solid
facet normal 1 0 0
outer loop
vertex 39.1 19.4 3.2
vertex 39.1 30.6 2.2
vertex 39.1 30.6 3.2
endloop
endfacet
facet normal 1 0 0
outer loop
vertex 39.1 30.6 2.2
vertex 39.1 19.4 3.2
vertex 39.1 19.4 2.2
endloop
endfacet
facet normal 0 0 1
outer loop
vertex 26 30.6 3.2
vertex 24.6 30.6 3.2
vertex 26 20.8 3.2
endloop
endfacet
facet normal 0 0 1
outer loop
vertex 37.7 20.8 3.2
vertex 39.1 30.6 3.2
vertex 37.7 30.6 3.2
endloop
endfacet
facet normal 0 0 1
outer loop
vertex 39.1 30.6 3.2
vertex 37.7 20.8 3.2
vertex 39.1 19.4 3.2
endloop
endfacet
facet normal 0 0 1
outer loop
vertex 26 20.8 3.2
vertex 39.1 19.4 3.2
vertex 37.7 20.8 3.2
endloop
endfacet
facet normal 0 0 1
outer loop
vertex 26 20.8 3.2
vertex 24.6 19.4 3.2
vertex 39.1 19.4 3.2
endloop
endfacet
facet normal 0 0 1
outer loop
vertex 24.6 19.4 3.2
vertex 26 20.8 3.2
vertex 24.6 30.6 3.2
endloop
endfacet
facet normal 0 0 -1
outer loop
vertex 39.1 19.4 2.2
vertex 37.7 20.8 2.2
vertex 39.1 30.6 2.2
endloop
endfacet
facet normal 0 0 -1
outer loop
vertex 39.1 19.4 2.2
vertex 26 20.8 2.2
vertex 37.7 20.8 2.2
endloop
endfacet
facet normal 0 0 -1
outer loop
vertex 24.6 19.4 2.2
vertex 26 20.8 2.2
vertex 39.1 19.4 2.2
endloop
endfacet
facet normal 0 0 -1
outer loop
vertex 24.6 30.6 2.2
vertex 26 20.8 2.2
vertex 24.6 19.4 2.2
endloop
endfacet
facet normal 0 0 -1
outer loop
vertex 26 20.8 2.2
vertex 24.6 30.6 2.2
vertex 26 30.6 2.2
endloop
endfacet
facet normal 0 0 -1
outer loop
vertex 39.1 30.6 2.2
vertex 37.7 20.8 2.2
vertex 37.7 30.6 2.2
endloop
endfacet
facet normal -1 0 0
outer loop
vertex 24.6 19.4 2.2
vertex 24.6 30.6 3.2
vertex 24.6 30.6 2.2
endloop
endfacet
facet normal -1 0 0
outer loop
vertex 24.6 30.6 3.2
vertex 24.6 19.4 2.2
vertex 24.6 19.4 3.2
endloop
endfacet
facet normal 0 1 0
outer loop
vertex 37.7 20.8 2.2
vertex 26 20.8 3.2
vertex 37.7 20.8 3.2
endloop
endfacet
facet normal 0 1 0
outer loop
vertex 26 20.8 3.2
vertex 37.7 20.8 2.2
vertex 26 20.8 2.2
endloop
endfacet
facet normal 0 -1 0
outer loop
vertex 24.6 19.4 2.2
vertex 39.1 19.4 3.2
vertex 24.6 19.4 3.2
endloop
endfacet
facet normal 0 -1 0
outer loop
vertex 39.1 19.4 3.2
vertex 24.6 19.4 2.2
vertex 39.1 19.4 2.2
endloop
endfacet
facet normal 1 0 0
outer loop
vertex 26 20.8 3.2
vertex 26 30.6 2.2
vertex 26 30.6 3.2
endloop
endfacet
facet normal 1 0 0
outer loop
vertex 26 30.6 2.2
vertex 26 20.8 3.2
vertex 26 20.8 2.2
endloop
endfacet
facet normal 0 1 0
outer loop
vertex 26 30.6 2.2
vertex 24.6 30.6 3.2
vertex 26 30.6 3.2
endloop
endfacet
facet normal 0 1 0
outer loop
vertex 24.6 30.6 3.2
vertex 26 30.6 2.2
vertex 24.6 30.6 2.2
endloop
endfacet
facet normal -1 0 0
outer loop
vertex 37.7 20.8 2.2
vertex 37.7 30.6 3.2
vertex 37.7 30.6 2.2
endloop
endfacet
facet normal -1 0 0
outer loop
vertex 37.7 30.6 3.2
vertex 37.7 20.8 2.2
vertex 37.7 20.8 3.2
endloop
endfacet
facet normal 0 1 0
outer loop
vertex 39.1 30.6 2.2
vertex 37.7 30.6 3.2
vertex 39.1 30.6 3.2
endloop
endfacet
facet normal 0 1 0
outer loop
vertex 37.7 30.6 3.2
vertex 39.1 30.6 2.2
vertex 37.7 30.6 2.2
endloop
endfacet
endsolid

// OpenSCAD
union() {
  translate([24.6, 19.4, 2.2]) cube(size=[14.5,1.4,1.0], center=false);
  translate([24.6, 19.4, 2.2]) cube(size=[1.4,11.2,1.0], center=false);
  translate([37.7, 19.4, 2.2]) cube(size=[1.4,11.2,1.0], center=false);
}
